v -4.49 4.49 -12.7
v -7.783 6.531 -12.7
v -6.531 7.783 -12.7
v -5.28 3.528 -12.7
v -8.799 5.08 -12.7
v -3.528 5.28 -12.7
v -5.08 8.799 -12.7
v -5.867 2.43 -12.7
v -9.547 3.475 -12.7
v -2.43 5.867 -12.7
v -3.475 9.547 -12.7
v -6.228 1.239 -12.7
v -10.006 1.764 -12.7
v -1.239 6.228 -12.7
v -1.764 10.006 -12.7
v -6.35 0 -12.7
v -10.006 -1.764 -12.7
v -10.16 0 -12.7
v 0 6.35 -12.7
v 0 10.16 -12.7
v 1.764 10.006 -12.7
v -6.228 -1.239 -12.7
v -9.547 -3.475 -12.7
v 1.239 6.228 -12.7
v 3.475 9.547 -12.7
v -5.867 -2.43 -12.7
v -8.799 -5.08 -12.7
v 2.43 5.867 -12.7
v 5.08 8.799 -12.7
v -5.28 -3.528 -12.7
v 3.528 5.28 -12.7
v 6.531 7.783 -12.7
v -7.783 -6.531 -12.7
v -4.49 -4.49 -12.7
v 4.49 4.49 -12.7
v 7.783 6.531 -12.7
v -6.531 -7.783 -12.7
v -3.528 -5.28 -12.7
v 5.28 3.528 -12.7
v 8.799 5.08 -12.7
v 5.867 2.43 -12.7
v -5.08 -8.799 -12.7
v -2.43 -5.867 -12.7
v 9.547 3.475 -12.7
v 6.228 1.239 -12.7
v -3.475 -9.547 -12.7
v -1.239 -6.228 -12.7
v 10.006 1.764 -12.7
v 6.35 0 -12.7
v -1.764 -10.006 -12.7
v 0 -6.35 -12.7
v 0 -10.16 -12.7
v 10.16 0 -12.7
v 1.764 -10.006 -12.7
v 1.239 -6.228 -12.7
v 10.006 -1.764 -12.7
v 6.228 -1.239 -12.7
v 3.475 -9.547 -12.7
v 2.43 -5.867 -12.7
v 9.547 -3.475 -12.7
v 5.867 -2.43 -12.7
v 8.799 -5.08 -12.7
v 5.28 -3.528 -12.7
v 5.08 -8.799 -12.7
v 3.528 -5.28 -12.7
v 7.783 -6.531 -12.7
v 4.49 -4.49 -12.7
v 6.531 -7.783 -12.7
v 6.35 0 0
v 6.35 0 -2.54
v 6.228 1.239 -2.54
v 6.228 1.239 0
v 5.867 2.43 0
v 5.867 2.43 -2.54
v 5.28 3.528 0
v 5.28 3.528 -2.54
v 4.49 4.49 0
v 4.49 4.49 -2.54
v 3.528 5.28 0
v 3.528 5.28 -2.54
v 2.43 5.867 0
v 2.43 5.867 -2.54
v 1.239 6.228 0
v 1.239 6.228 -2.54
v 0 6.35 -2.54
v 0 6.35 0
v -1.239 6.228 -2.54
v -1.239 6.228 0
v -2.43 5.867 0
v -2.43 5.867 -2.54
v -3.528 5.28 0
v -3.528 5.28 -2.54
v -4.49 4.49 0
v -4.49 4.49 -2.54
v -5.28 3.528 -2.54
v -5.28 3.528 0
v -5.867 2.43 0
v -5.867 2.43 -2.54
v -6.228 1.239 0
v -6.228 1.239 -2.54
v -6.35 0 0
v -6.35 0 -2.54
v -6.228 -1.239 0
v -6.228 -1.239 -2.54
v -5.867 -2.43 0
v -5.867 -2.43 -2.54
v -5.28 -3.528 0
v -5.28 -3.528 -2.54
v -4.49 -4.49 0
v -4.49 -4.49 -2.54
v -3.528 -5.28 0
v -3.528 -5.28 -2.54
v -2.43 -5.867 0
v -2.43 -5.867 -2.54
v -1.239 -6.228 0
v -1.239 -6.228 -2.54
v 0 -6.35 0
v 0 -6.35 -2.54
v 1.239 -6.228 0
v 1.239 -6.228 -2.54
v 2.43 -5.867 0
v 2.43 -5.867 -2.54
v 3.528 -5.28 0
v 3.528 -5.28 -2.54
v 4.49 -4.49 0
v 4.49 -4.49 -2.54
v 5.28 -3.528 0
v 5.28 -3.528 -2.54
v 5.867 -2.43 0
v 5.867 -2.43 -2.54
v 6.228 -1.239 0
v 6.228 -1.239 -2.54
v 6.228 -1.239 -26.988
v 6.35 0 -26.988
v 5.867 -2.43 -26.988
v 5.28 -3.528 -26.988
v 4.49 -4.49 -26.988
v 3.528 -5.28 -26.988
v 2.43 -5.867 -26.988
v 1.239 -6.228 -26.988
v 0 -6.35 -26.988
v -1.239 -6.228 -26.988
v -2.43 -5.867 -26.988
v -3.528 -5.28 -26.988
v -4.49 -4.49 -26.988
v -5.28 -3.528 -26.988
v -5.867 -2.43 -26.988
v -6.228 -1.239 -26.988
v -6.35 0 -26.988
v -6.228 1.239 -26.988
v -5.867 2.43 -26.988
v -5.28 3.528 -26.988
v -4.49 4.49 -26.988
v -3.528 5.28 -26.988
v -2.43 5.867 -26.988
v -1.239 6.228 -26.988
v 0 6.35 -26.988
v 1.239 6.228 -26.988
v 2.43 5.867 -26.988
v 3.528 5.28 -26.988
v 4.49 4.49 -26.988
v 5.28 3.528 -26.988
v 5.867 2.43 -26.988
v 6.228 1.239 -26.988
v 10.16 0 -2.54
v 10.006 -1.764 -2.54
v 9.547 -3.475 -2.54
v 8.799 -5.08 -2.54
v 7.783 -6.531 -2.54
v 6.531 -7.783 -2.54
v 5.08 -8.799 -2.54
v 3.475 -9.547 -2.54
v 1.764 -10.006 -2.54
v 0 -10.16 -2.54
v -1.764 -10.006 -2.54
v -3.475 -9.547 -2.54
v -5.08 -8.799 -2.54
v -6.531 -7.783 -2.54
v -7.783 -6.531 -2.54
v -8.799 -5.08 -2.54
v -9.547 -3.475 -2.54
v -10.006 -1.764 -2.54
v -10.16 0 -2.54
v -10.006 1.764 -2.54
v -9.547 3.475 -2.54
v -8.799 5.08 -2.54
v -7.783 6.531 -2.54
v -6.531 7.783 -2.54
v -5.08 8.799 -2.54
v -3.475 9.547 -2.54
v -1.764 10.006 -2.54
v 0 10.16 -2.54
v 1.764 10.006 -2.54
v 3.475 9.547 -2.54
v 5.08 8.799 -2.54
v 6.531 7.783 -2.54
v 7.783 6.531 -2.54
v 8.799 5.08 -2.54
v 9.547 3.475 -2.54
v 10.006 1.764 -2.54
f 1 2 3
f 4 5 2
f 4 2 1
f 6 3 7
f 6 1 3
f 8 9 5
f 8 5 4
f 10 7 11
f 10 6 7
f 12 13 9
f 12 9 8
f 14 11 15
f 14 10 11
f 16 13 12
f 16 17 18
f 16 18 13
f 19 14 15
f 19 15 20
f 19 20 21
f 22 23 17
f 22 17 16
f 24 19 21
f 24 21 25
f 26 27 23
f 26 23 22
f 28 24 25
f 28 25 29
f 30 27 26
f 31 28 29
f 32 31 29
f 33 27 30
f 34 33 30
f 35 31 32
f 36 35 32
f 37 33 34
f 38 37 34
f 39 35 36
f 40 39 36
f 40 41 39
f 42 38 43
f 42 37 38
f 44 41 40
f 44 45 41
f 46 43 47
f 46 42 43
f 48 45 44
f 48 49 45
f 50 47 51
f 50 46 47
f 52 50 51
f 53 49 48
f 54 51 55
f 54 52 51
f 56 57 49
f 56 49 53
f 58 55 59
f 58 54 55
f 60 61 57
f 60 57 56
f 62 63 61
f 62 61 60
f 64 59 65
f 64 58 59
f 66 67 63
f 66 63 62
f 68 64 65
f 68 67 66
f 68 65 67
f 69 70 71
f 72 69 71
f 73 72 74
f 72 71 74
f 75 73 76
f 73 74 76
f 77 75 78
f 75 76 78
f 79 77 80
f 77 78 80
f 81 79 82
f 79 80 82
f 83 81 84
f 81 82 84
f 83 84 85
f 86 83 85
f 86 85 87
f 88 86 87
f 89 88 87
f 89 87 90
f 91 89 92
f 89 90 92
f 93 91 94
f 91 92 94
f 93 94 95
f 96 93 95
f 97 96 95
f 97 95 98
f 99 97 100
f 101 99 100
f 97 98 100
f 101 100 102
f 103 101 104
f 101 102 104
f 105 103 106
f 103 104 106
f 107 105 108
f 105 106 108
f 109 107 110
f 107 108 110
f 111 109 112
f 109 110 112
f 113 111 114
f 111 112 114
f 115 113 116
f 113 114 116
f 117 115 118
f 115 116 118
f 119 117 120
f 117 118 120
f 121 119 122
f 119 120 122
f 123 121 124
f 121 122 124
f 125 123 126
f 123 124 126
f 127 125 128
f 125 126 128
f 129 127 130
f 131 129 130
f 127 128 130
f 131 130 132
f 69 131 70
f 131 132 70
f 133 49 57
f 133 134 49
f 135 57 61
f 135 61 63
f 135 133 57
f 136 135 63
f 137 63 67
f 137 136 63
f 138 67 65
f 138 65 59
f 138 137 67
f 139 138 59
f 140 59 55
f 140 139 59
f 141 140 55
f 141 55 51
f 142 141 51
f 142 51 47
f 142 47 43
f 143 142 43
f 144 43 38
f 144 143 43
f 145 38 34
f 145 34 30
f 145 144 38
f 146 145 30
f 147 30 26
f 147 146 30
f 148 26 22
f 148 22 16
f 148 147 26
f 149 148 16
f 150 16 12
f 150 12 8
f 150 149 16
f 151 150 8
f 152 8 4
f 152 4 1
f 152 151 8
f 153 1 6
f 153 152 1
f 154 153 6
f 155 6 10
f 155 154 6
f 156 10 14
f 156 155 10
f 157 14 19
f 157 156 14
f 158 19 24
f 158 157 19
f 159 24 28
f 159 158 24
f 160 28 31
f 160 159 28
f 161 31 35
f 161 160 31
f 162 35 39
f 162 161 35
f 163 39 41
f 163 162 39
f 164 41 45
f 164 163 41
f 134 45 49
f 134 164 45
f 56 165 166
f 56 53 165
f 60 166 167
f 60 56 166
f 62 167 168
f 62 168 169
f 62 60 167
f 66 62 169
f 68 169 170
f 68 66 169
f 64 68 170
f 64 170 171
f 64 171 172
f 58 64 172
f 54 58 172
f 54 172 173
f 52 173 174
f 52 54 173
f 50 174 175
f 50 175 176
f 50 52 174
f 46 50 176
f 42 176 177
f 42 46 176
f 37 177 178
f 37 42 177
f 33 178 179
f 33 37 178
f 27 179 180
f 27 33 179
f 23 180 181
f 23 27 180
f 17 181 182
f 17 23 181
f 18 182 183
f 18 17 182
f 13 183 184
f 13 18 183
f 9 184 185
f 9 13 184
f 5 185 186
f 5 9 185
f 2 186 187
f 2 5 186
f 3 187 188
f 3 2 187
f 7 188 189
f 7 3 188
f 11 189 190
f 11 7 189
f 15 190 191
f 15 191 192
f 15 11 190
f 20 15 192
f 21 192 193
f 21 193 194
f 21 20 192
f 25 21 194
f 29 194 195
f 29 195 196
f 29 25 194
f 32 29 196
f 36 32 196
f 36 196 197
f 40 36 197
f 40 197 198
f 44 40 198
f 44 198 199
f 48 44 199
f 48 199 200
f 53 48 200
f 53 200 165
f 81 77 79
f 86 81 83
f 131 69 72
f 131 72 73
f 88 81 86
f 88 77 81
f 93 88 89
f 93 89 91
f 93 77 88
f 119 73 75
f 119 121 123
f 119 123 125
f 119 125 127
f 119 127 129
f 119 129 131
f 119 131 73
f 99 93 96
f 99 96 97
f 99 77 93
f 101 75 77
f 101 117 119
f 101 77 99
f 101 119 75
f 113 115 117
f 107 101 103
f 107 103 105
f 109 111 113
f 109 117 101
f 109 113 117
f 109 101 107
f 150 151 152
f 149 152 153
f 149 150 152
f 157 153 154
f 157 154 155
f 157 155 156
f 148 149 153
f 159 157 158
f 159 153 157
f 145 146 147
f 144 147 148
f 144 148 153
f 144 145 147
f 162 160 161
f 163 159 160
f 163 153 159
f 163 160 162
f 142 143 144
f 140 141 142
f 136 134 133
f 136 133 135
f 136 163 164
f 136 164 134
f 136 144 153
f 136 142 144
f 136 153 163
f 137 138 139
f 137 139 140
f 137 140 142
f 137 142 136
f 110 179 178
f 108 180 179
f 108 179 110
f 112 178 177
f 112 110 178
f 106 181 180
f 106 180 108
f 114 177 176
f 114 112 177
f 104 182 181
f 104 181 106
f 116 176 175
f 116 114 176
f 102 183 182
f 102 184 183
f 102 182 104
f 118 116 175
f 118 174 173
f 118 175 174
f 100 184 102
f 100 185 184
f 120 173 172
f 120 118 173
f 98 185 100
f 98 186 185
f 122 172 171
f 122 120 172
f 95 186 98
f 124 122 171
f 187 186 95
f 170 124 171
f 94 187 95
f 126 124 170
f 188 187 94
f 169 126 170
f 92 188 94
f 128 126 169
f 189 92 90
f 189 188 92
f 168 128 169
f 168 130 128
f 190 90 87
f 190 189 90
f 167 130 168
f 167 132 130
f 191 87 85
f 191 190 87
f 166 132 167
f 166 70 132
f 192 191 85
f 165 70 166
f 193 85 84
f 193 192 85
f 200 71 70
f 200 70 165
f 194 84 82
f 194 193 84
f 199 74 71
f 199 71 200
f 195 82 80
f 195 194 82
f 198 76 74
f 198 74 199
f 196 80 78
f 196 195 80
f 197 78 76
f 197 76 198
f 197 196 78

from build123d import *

# Parameters (mm, degrees)
CUT_EXTRUDE1_START = -2.54
SKETCH2_R          = 10.195320638
SKETCH2_R_2        = 6.35
CUT_EXTRUDE1_DEPTH = 2.54


with BuildPart() as part:
    # Sketch1 → Revolve1 (revolve)
    with BuildSketch(Plane(origin=(0, 0, 0), x_dir=(0, 0, -1), z_dir=(1, 0, 0)), mode=Mode.PRIVATE) as revolve1_sk:
        Polygon((0, 0), (0, 10.16), (12.7, 10.16), (12.7, 6.35), (26.9875, 6.35), (26.9875, 0), align=None)
    revolve(revolve1_sk.sketch.rotate(Axis((0, 0, 0), (0, 0, -1)), 90), axis=Axis((0, 0, 0), (0, 0, -1)))

    # Sketch2 → Cut-Extrude1 (cut)
    with BuildSketch(Plane.XY.offset(CUT_EXTRUDE1_START)):
        Circle(SKETCH2_R)
        Circle(SKETCH2_R_2, mode=Mode.SUBTRACT)
    extrude(amount=CUT_EXTRUDE1_DEPTH, mode=Mode.SUBTRACT)


solid = part.part
